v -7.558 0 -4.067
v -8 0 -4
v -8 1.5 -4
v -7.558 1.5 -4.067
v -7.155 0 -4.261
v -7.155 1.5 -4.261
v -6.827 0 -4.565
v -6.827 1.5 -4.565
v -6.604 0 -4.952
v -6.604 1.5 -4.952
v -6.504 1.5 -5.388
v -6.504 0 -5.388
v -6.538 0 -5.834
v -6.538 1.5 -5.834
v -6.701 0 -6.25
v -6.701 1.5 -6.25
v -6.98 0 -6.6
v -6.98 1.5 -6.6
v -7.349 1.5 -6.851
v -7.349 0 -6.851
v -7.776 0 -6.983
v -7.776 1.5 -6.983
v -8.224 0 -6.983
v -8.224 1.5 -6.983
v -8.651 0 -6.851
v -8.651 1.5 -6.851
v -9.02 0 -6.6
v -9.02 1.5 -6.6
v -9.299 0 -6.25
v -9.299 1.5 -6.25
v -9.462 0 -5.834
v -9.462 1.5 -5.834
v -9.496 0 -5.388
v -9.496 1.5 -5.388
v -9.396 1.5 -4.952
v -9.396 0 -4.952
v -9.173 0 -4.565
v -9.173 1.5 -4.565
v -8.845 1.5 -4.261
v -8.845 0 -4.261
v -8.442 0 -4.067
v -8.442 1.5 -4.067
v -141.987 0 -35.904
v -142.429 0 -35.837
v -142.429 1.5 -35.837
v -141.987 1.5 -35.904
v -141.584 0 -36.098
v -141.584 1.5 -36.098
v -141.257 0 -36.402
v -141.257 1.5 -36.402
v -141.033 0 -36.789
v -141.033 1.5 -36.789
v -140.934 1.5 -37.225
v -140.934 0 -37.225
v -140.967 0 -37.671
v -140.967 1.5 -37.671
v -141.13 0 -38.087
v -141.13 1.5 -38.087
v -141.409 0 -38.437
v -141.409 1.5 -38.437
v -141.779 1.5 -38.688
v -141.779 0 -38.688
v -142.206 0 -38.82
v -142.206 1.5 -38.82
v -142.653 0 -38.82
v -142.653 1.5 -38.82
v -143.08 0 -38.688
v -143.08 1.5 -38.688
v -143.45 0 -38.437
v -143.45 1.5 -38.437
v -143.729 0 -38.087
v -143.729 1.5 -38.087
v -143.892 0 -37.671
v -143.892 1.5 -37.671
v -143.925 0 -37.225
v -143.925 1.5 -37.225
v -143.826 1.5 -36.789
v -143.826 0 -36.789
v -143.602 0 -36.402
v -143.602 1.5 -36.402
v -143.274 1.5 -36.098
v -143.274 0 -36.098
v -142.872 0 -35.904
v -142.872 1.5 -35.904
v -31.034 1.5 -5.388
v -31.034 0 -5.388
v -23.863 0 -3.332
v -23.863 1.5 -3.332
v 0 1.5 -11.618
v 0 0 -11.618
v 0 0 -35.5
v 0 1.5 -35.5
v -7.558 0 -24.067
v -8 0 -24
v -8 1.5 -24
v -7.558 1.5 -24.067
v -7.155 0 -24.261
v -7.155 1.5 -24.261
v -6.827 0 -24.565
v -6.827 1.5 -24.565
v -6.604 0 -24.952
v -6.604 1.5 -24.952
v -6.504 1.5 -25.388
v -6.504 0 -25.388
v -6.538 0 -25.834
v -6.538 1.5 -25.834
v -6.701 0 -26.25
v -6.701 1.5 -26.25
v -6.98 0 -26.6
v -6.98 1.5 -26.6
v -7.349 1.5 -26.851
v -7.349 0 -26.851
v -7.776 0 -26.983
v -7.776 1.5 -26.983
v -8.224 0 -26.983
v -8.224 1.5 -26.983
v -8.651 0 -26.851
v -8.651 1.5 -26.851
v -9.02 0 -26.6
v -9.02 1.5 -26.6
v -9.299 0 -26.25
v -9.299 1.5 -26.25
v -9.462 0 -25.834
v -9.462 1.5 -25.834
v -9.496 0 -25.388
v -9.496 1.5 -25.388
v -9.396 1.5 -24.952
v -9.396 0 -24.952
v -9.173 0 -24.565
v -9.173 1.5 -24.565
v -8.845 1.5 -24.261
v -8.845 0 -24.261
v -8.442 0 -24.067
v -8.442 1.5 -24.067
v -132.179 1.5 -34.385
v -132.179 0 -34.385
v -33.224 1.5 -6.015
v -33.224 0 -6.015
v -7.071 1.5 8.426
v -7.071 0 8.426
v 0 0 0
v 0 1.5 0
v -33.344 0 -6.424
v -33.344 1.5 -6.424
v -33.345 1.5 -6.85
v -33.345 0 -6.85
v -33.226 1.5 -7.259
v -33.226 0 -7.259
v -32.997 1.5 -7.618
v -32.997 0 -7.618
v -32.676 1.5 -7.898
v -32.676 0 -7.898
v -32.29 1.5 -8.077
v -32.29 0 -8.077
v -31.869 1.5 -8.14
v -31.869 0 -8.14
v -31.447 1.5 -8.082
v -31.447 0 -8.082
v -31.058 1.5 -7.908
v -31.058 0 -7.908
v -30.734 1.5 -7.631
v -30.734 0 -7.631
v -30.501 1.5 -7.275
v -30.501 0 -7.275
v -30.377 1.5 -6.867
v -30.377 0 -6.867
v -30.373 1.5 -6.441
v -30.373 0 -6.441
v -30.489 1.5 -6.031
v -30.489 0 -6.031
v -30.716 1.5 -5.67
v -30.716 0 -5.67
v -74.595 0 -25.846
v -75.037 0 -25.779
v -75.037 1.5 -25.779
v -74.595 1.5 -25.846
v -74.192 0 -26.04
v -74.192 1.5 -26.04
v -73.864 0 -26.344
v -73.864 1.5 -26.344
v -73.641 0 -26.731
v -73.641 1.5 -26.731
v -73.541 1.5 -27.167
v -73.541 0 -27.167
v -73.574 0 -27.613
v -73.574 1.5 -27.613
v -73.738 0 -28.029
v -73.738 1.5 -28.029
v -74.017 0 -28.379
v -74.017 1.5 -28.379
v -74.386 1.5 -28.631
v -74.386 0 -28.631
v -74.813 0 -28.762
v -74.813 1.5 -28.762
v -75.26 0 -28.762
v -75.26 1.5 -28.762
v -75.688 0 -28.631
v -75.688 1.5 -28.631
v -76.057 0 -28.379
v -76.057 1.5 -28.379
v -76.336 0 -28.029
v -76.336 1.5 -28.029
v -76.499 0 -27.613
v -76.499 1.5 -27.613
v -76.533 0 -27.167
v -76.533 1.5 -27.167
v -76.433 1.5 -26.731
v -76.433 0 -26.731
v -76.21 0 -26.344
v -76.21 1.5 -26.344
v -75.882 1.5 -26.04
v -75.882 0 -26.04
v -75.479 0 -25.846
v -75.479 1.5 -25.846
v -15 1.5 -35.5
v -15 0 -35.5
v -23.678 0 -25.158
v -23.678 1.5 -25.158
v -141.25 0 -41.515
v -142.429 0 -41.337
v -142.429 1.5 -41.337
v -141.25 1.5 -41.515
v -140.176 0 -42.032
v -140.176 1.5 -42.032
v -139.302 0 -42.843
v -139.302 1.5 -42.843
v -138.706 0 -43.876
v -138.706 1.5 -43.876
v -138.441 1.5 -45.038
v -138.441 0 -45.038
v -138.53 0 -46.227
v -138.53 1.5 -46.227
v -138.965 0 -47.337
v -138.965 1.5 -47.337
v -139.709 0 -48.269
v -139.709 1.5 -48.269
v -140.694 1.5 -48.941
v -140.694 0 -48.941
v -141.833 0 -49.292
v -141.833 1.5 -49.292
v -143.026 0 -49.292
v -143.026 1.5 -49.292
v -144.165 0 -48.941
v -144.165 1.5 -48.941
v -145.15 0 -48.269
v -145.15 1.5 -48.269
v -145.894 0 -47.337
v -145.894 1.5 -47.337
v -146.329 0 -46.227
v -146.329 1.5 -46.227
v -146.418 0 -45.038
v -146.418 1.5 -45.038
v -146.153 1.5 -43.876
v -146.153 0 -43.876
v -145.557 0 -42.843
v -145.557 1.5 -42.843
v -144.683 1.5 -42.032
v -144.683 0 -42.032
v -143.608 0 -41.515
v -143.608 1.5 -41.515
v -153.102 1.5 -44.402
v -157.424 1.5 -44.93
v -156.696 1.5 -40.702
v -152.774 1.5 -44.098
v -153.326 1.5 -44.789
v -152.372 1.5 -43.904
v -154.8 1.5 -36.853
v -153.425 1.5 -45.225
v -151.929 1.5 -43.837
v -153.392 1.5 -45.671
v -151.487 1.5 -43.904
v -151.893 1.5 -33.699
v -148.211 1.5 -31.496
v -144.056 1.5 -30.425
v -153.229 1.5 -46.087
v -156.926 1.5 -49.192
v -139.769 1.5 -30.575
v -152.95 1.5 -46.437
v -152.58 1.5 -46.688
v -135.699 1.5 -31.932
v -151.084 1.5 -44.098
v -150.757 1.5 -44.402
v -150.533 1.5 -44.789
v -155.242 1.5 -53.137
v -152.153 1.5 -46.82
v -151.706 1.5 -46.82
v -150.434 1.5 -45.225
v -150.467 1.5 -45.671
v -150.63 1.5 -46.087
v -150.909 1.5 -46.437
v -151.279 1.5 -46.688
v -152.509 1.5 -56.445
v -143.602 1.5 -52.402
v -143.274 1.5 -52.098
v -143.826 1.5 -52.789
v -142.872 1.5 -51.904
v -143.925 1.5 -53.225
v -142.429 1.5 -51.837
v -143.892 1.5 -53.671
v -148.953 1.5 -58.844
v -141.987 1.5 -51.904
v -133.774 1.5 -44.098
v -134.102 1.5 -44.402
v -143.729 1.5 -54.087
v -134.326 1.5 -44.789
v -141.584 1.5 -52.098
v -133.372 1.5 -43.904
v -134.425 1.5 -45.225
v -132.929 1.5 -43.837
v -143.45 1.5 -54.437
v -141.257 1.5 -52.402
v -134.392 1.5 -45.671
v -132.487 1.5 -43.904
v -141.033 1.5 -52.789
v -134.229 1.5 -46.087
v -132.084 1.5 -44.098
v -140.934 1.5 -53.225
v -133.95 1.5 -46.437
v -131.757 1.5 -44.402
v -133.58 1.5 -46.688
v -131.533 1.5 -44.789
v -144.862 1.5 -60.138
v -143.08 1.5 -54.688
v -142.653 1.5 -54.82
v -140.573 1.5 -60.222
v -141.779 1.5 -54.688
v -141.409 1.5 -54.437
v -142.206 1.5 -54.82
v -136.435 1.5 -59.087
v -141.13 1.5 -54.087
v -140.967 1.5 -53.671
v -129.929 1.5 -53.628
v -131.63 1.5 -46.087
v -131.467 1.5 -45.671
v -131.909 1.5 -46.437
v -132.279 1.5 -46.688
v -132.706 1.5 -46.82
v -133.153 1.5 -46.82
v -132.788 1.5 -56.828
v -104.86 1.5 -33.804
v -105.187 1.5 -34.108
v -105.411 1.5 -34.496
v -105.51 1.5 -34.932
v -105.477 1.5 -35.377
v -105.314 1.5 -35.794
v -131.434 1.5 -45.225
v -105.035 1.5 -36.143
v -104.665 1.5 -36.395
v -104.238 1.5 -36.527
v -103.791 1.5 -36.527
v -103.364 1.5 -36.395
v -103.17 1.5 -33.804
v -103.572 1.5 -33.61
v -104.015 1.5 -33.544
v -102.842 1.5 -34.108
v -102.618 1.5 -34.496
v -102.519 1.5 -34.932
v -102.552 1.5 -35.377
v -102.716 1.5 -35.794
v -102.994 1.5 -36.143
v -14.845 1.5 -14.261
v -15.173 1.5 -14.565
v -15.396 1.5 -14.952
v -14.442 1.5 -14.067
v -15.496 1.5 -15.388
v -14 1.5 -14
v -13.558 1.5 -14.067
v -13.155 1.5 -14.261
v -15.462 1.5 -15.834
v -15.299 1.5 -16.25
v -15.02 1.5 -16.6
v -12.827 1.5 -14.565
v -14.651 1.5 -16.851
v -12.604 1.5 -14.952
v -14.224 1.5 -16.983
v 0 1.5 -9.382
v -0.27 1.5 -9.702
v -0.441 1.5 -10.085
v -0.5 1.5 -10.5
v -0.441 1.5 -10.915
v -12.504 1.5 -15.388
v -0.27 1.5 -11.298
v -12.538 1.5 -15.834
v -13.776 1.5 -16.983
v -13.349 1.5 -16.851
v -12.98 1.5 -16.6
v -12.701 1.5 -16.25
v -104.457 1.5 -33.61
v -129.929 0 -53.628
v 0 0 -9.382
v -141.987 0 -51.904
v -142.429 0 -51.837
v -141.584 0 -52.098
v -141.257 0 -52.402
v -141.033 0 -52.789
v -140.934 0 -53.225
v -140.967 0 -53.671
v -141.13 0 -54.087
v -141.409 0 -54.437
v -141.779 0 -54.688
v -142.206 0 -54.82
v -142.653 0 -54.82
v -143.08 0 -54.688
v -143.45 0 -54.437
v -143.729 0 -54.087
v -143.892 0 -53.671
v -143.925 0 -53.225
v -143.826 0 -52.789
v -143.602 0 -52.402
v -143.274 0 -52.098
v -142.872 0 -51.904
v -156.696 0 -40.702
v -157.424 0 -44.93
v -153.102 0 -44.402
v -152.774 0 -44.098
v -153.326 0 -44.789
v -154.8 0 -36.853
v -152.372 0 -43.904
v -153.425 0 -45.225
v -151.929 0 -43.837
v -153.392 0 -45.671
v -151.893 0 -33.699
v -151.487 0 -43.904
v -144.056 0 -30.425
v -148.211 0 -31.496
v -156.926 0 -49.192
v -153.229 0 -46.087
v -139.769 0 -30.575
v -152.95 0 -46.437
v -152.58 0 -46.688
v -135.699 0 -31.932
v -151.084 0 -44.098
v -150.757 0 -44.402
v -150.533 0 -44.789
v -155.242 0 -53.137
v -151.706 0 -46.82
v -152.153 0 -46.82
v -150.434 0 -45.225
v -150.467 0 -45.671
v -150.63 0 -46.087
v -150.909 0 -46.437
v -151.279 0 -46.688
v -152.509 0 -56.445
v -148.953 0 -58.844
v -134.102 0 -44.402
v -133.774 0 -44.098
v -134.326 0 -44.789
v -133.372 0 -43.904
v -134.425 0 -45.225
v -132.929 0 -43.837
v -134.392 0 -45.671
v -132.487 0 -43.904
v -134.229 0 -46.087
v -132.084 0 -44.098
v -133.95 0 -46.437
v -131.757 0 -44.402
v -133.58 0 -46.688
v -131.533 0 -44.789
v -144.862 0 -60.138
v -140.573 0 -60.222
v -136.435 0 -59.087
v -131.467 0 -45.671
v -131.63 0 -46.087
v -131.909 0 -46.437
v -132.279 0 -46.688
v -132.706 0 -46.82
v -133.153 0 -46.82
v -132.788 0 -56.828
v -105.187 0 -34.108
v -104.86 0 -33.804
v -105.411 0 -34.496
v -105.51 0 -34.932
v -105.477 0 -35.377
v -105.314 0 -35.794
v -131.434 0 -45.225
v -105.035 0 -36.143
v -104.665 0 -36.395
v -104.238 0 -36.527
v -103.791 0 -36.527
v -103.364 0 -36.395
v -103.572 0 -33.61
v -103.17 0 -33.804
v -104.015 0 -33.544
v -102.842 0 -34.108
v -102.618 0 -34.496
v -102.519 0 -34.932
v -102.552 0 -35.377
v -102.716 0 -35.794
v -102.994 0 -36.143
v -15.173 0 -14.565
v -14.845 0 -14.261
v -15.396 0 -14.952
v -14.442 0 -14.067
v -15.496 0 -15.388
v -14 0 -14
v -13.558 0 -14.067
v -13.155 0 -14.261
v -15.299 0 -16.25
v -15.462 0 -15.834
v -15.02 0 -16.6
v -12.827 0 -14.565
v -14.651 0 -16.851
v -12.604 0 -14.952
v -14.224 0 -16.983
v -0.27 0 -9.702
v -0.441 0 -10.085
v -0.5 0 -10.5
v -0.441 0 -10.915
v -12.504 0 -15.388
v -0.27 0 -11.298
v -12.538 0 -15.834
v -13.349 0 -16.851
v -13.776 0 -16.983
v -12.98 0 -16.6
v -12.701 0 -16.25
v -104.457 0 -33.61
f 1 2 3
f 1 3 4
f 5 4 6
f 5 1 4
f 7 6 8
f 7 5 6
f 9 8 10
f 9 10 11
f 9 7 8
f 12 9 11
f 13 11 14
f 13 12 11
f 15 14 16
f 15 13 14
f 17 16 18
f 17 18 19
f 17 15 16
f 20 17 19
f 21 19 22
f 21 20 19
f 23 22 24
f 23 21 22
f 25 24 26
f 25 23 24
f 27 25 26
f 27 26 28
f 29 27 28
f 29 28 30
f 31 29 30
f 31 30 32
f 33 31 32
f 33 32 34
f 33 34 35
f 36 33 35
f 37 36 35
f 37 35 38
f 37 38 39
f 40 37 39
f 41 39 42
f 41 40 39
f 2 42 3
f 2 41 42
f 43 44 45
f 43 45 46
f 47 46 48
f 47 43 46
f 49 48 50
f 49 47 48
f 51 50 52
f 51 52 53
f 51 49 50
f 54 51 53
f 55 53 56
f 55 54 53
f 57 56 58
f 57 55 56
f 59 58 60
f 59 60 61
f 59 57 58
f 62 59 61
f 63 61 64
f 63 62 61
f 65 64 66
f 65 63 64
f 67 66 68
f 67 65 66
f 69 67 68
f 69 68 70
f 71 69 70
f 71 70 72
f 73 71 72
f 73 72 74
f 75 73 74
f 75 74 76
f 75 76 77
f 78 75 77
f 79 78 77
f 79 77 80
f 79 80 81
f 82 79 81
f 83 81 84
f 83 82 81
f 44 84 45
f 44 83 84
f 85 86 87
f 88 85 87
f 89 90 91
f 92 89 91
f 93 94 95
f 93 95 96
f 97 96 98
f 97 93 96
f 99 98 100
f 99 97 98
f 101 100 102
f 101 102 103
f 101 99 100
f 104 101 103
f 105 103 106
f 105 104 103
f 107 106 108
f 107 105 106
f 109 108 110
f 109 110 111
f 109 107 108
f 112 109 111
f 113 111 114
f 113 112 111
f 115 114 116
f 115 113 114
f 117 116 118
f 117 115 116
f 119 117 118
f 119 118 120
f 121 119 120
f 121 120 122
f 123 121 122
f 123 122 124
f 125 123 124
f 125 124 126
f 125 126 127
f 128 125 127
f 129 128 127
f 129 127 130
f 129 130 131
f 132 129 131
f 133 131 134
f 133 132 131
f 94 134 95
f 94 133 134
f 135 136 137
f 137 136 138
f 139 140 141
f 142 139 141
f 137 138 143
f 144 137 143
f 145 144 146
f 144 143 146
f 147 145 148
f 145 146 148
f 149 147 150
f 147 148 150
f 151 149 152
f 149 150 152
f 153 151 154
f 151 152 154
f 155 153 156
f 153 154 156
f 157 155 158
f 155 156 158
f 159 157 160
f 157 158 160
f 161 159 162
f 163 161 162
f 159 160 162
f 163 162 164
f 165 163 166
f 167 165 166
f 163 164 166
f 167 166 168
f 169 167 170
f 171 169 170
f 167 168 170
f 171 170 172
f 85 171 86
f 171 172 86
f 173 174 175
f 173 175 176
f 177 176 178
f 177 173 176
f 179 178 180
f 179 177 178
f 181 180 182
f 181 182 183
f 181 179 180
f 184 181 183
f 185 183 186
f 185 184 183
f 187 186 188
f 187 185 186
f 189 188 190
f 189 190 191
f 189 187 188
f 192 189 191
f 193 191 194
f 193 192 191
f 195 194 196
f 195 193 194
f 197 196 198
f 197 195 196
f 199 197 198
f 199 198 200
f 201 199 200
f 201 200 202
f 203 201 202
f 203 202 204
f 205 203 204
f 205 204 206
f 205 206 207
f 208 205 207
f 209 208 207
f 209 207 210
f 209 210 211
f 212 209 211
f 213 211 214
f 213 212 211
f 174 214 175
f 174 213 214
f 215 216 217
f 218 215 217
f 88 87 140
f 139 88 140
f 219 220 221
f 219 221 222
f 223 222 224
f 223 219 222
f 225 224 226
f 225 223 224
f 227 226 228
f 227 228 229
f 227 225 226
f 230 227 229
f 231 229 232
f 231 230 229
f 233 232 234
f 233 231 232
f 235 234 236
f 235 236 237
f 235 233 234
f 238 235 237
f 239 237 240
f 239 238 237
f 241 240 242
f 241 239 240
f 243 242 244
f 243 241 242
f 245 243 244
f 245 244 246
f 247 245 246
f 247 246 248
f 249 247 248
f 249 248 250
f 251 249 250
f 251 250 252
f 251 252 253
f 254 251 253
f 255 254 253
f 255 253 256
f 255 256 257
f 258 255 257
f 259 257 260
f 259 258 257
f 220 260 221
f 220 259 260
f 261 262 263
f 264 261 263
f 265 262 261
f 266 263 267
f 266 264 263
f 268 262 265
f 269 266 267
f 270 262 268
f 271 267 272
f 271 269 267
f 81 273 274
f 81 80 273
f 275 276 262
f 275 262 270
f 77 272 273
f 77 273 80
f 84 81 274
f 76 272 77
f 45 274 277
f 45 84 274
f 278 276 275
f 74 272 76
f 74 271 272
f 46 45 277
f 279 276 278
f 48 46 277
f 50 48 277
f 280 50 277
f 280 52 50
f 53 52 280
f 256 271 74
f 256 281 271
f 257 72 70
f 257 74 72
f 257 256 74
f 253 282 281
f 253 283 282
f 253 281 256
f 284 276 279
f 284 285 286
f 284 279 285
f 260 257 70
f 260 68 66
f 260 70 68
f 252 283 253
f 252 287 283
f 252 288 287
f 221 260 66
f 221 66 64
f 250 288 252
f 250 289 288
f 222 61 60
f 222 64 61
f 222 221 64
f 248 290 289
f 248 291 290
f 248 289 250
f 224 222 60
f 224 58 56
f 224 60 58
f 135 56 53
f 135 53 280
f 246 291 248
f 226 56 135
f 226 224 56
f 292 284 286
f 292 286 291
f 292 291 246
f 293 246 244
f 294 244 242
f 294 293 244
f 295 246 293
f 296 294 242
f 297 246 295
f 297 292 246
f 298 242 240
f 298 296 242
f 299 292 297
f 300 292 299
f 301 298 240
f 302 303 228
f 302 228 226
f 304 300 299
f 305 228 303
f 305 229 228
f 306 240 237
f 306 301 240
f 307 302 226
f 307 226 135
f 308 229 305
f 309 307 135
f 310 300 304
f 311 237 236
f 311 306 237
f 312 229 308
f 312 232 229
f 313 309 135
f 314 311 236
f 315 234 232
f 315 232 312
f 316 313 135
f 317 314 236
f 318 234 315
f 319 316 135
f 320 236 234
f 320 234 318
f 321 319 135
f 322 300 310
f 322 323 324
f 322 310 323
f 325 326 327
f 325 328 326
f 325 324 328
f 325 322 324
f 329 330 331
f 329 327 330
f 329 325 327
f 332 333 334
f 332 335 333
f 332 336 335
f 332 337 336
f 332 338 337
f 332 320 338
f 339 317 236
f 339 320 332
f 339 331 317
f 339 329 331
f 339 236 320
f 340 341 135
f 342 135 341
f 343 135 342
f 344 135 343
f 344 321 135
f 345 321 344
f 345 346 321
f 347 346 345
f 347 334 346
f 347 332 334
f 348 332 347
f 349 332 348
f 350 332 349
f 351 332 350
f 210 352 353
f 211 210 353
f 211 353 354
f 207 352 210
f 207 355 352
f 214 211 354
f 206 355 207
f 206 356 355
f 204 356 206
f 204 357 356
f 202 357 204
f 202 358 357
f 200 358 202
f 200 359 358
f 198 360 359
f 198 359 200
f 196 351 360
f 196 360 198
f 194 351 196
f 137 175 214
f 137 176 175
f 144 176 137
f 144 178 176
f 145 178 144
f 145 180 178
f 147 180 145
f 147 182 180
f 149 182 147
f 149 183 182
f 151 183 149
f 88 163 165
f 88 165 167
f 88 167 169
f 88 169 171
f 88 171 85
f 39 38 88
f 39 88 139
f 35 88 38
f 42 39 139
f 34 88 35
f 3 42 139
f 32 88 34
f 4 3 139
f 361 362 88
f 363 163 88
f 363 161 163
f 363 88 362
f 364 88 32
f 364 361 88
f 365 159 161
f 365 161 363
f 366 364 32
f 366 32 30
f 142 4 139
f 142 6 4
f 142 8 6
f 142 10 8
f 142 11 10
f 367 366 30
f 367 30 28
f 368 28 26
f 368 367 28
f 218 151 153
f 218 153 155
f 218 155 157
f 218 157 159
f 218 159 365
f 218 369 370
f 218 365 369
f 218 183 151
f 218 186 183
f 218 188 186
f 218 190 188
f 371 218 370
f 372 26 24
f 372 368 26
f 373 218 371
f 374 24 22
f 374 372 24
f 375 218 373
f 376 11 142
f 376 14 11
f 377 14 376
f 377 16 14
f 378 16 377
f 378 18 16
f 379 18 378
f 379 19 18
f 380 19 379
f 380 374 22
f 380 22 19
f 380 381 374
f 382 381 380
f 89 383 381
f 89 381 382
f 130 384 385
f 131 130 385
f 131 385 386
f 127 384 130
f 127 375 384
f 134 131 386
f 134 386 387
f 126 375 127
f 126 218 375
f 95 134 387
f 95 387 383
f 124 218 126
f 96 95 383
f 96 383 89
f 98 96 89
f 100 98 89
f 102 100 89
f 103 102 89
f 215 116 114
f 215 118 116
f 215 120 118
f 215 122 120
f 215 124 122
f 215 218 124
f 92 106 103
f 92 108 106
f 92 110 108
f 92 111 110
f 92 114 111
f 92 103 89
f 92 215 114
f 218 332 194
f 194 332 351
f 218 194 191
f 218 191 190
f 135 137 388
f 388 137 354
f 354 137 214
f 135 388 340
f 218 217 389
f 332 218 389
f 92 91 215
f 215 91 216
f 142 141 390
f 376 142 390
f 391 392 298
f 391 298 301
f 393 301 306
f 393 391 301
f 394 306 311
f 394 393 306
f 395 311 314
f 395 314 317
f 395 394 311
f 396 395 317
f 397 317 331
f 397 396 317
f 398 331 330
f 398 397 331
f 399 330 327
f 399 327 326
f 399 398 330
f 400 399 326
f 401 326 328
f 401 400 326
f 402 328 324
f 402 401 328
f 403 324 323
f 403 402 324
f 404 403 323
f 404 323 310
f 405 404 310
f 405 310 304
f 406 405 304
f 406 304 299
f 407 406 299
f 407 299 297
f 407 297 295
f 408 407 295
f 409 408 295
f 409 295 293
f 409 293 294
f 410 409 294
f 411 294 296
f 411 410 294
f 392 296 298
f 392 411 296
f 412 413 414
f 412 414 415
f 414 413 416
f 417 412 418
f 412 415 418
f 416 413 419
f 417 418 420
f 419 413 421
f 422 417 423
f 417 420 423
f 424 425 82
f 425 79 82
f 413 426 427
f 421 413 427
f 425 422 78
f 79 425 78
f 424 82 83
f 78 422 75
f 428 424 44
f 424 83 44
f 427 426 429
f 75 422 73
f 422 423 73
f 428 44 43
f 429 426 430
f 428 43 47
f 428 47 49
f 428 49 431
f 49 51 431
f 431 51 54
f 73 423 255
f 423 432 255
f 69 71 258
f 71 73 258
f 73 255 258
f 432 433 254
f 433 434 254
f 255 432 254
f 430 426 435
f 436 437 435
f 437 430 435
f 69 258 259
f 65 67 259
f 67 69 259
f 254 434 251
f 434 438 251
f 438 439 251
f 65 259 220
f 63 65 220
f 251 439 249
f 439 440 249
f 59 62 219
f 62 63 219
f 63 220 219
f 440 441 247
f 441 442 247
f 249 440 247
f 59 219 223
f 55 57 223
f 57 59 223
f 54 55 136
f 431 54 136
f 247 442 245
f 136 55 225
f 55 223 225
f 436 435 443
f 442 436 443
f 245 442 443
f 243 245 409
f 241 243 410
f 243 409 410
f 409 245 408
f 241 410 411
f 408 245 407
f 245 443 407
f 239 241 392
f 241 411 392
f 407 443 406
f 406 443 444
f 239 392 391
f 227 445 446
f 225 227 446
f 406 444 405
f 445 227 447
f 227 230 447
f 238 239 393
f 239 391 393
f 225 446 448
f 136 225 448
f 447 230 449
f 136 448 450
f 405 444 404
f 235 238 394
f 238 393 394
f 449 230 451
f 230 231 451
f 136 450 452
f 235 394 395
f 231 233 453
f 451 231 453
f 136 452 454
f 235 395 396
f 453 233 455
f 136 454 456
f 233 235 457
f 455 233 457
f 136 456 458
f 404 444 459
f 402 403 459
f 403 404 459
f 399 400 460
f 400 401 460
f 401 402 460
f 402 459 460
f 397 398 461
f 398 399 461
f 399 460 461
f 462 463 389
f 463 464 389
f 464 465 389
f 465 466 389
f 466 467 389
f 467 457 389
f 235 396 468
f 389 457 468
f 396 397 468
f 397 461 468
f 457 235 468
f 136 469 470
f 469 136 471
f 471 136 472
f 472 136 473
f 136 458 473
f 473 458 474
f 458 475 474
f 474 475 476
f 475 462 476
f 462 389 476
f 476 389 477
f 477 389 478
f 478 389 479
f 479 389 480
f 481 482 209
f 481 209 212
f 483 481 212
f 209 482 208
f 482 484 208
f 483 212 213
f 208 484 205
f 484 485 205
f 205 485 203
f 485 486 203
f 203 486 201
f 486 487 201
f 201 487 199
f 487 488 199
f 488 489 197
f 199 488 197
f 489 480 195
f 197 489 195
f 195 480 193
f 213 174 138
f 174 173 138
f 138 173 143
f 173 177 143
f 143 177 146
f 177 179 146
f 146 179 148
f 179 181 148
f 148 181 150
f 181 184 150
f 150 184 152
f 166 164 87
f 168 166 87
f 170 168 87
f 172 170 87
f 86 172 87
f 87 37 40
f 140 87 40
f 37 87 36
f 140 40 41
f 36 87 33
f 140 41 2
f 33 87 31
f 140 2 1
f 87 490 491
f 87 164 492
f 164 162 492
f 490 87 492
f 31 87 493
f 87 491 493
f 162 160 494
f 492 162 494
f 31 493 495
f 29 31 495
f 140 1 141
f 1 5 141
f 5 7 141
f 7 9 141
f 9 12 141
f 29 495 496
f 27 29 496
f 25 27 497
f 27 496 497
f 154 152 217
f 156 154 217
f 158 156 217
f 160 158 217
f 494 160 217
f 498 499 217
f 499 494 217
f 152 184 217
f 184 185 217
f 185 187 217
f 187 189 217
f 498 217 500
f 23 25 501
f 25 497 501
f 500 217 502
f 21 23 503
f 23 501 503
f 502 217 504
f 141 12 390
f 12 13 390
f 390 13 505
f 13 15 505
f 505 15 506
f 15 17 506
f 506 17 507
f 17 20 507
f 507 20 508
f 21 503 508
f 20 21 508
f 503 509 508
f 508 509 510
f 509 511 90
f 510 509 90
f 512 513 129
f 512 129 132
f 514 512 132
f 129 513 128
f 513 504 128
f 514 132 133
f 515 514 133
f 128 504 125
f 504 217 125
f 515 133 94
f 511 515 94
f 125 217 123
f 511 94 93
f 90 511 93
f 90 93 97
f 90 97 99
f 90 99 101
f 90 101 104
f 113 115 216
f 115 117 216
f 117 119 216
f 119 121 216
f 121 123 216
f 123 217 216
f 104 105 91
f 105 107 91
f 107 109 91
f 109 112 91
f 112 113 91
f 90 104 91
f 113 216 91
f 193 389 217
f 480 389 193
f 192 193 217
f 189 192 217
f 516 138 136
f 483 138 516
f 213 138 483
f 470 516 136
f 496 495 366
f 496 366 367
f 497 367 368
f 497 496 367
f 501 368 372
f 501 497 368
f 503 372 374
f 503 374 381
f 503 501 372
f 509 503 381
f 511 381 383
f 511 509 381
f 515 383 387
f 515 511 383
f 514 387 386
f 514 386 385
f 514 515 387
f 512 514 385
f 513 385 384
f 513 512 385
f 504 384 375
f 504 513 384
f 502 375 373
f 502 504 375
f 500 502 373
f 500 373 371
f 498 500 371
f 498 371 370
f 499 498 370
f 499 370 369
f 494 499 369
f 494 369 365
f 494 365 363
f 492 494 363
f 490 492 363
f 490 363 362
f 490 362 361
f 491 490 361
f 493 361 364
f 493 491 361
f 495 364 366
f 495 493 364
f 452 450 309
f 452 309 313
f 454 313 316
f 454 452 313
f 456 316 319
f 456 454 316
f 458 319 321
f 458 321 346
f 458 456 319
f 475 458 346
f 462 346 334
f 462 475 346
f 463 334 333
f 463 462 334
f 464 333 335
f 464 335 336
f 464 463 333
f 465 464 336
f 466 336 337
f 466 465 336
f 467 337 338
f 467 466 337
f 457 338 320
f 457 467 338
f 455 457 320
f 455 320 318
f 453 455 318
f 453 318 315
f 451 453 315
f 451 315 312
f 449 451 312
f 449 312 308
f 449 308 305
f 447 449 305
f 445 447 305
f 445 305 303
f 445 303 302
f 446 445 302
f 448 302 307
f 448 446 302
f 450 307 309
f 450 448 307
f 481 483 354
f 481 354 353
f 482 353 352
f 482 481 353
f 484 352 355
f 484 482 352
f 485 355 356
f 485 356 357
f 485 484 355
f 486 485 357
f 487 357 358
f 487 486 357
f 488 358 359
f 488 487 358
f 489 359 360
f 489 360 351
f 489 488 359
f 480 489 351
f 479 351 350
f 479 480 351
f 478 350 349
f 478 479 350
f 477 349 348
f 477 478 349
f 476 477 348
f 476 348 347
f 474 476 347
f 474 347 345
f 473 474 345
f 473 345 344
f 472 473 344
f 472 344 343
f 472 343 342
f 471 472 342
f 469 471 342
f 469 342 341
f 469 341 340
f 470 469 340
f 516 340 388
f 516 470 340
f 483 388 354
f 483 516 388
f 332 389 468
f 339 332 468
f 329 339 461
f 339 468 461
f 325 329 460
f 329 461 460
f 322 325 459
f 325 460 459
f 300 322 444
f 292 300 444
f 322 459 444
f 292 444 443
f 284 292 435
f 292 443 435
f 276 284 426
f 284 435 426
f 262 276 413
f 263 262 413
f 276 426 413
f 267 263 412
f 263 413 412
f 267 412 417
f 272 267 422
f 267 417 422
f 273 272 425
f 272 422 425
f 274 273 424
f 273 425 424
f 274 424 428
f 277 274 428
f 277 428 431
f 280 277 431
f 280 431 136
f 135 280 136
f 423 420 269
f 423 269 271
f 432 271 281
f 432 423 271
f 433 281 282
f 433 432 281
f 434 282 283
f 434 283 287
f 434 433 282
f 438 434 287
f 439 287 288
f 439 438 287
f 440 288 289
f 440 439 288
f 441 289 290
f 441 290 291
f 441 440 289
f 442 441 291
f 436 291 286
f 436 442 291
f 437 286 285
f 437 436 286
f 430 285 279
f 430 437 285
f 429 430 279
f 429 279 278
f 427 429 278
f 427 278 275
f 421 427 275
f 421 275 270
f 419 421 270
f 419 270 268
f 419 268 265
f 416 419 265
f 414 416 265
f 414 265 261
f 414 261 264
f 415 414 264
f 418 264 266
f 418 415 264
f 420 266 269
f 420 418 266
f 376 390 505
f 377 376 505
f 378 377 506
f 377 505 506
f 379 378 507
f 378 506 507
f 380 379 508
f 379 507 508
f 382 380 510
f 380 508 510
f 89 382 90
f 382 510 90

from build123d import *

# Parameters (mm, degrees)
SKETCH1_R           = 1.5
SKETCH1_R_2         = 4
BOSS_EXTRUDE1_DEPTH = 1.5


with BuildPart() as part:
    # Sketch1 → Boss-Extrude1 (new body)
    with BuildSketch(Plane(origin=(0, 0, 0), x_dir=(1, 0, 0), z_dir=(0, 1, 0))):
        with BuildLine():
            Line((-7.070663707, -8.426488874), (0, 0))
            Line((0, 0), (0, 9.381966011))
            ThreePointArc((0, 9.381966011), (-0.5, 10.5), (0, 11.618033989))
            Line((0, 11.618033989), (0, 35.5))
            Line((0, 35.5), (-15, 35.5))
            Line((-15, 35.5), (-23.677632731, 25.158400018))
            Line((-23.677632731, 25.158400018), (-129.929473623, 53.628494979))
            ThreePointArc((-129.929473623, 53.628494979), (-157.327989791, 47.078833109), (-132.17932297, 34.38547595))
            Line((-132.17932297, 34.38547595), (-33.223789423, 6.015437425))
            ThreePointArc((-33.223789423, 6.015437425), (-31.446611343, 8.081911862), (-31.03429168, 5.387719772))
            Line((-31.03429168, 5.387719772), (-23.863280614, 3.331828071))
            Line((-23.863280614, 3.331828071), (-7.070663707, -8.426488874))
        make_face()
        with Locations(Location((-8, 5.5, 0), (0, 0, 270))):
            Circle(SKETCH1_R, mode=Mode.SUBTRACT)
        with Locations(Location((-14, 15.5, 0), (0, 0, 270))):
            Circle(SKETCH1_R, mode=Mode.SUBTRACT)
        with Locations(Location((-8, 25.5, 0), (0, 0, 270))):
            Circle(SKETCH1_R, mode=Mode.SUBTRACT)
        with Locations(Location((-142.429473623, 37.336933003, 0), (0, 0, 270))):
            Circle(SKETCH1_R, mode=Mode.SUBTRACT)
        with Locations(Location((-104.014603511, 35.04369958, 0), (0, 0, 270))):
            Circle(SKETCH1_R, mode=Mode.SUBTRACT)
        with Locations(Location((-151.929473623, 45.336933003, 0), (0, 0, 270))):
            Circle(SKETCH1_R, mode=Mode.SUBTRACT)
        with Locations(Location((-142.429473623, 45.336933003, 0), (0, 0, 270))):
            Circle(SKETCH1_R_2, mode=Mode.SUBTRACT)
        with Locations(Location((-132.929473623, 45.336933003, 0), (0, 0, 270))):
            Circle(SKETCH1_R, mode=Mode.SUBTRACT)
        with Locations(Location((-142.429473623, 53.336933003, 0), (0, 0, 270))):
            Circle(SKETCH1_R, mode=Mode.SUBTRACT)
        with Locations(Location((-75.036828722, 27.279128226, 0), (0, 0, 270))):
            Circle(SKETCH1_R, mode=Mode.SUBTRACT)
    extrude(amount=BOSS_EXTRUDE1_DEPTH)


solid = part.part
